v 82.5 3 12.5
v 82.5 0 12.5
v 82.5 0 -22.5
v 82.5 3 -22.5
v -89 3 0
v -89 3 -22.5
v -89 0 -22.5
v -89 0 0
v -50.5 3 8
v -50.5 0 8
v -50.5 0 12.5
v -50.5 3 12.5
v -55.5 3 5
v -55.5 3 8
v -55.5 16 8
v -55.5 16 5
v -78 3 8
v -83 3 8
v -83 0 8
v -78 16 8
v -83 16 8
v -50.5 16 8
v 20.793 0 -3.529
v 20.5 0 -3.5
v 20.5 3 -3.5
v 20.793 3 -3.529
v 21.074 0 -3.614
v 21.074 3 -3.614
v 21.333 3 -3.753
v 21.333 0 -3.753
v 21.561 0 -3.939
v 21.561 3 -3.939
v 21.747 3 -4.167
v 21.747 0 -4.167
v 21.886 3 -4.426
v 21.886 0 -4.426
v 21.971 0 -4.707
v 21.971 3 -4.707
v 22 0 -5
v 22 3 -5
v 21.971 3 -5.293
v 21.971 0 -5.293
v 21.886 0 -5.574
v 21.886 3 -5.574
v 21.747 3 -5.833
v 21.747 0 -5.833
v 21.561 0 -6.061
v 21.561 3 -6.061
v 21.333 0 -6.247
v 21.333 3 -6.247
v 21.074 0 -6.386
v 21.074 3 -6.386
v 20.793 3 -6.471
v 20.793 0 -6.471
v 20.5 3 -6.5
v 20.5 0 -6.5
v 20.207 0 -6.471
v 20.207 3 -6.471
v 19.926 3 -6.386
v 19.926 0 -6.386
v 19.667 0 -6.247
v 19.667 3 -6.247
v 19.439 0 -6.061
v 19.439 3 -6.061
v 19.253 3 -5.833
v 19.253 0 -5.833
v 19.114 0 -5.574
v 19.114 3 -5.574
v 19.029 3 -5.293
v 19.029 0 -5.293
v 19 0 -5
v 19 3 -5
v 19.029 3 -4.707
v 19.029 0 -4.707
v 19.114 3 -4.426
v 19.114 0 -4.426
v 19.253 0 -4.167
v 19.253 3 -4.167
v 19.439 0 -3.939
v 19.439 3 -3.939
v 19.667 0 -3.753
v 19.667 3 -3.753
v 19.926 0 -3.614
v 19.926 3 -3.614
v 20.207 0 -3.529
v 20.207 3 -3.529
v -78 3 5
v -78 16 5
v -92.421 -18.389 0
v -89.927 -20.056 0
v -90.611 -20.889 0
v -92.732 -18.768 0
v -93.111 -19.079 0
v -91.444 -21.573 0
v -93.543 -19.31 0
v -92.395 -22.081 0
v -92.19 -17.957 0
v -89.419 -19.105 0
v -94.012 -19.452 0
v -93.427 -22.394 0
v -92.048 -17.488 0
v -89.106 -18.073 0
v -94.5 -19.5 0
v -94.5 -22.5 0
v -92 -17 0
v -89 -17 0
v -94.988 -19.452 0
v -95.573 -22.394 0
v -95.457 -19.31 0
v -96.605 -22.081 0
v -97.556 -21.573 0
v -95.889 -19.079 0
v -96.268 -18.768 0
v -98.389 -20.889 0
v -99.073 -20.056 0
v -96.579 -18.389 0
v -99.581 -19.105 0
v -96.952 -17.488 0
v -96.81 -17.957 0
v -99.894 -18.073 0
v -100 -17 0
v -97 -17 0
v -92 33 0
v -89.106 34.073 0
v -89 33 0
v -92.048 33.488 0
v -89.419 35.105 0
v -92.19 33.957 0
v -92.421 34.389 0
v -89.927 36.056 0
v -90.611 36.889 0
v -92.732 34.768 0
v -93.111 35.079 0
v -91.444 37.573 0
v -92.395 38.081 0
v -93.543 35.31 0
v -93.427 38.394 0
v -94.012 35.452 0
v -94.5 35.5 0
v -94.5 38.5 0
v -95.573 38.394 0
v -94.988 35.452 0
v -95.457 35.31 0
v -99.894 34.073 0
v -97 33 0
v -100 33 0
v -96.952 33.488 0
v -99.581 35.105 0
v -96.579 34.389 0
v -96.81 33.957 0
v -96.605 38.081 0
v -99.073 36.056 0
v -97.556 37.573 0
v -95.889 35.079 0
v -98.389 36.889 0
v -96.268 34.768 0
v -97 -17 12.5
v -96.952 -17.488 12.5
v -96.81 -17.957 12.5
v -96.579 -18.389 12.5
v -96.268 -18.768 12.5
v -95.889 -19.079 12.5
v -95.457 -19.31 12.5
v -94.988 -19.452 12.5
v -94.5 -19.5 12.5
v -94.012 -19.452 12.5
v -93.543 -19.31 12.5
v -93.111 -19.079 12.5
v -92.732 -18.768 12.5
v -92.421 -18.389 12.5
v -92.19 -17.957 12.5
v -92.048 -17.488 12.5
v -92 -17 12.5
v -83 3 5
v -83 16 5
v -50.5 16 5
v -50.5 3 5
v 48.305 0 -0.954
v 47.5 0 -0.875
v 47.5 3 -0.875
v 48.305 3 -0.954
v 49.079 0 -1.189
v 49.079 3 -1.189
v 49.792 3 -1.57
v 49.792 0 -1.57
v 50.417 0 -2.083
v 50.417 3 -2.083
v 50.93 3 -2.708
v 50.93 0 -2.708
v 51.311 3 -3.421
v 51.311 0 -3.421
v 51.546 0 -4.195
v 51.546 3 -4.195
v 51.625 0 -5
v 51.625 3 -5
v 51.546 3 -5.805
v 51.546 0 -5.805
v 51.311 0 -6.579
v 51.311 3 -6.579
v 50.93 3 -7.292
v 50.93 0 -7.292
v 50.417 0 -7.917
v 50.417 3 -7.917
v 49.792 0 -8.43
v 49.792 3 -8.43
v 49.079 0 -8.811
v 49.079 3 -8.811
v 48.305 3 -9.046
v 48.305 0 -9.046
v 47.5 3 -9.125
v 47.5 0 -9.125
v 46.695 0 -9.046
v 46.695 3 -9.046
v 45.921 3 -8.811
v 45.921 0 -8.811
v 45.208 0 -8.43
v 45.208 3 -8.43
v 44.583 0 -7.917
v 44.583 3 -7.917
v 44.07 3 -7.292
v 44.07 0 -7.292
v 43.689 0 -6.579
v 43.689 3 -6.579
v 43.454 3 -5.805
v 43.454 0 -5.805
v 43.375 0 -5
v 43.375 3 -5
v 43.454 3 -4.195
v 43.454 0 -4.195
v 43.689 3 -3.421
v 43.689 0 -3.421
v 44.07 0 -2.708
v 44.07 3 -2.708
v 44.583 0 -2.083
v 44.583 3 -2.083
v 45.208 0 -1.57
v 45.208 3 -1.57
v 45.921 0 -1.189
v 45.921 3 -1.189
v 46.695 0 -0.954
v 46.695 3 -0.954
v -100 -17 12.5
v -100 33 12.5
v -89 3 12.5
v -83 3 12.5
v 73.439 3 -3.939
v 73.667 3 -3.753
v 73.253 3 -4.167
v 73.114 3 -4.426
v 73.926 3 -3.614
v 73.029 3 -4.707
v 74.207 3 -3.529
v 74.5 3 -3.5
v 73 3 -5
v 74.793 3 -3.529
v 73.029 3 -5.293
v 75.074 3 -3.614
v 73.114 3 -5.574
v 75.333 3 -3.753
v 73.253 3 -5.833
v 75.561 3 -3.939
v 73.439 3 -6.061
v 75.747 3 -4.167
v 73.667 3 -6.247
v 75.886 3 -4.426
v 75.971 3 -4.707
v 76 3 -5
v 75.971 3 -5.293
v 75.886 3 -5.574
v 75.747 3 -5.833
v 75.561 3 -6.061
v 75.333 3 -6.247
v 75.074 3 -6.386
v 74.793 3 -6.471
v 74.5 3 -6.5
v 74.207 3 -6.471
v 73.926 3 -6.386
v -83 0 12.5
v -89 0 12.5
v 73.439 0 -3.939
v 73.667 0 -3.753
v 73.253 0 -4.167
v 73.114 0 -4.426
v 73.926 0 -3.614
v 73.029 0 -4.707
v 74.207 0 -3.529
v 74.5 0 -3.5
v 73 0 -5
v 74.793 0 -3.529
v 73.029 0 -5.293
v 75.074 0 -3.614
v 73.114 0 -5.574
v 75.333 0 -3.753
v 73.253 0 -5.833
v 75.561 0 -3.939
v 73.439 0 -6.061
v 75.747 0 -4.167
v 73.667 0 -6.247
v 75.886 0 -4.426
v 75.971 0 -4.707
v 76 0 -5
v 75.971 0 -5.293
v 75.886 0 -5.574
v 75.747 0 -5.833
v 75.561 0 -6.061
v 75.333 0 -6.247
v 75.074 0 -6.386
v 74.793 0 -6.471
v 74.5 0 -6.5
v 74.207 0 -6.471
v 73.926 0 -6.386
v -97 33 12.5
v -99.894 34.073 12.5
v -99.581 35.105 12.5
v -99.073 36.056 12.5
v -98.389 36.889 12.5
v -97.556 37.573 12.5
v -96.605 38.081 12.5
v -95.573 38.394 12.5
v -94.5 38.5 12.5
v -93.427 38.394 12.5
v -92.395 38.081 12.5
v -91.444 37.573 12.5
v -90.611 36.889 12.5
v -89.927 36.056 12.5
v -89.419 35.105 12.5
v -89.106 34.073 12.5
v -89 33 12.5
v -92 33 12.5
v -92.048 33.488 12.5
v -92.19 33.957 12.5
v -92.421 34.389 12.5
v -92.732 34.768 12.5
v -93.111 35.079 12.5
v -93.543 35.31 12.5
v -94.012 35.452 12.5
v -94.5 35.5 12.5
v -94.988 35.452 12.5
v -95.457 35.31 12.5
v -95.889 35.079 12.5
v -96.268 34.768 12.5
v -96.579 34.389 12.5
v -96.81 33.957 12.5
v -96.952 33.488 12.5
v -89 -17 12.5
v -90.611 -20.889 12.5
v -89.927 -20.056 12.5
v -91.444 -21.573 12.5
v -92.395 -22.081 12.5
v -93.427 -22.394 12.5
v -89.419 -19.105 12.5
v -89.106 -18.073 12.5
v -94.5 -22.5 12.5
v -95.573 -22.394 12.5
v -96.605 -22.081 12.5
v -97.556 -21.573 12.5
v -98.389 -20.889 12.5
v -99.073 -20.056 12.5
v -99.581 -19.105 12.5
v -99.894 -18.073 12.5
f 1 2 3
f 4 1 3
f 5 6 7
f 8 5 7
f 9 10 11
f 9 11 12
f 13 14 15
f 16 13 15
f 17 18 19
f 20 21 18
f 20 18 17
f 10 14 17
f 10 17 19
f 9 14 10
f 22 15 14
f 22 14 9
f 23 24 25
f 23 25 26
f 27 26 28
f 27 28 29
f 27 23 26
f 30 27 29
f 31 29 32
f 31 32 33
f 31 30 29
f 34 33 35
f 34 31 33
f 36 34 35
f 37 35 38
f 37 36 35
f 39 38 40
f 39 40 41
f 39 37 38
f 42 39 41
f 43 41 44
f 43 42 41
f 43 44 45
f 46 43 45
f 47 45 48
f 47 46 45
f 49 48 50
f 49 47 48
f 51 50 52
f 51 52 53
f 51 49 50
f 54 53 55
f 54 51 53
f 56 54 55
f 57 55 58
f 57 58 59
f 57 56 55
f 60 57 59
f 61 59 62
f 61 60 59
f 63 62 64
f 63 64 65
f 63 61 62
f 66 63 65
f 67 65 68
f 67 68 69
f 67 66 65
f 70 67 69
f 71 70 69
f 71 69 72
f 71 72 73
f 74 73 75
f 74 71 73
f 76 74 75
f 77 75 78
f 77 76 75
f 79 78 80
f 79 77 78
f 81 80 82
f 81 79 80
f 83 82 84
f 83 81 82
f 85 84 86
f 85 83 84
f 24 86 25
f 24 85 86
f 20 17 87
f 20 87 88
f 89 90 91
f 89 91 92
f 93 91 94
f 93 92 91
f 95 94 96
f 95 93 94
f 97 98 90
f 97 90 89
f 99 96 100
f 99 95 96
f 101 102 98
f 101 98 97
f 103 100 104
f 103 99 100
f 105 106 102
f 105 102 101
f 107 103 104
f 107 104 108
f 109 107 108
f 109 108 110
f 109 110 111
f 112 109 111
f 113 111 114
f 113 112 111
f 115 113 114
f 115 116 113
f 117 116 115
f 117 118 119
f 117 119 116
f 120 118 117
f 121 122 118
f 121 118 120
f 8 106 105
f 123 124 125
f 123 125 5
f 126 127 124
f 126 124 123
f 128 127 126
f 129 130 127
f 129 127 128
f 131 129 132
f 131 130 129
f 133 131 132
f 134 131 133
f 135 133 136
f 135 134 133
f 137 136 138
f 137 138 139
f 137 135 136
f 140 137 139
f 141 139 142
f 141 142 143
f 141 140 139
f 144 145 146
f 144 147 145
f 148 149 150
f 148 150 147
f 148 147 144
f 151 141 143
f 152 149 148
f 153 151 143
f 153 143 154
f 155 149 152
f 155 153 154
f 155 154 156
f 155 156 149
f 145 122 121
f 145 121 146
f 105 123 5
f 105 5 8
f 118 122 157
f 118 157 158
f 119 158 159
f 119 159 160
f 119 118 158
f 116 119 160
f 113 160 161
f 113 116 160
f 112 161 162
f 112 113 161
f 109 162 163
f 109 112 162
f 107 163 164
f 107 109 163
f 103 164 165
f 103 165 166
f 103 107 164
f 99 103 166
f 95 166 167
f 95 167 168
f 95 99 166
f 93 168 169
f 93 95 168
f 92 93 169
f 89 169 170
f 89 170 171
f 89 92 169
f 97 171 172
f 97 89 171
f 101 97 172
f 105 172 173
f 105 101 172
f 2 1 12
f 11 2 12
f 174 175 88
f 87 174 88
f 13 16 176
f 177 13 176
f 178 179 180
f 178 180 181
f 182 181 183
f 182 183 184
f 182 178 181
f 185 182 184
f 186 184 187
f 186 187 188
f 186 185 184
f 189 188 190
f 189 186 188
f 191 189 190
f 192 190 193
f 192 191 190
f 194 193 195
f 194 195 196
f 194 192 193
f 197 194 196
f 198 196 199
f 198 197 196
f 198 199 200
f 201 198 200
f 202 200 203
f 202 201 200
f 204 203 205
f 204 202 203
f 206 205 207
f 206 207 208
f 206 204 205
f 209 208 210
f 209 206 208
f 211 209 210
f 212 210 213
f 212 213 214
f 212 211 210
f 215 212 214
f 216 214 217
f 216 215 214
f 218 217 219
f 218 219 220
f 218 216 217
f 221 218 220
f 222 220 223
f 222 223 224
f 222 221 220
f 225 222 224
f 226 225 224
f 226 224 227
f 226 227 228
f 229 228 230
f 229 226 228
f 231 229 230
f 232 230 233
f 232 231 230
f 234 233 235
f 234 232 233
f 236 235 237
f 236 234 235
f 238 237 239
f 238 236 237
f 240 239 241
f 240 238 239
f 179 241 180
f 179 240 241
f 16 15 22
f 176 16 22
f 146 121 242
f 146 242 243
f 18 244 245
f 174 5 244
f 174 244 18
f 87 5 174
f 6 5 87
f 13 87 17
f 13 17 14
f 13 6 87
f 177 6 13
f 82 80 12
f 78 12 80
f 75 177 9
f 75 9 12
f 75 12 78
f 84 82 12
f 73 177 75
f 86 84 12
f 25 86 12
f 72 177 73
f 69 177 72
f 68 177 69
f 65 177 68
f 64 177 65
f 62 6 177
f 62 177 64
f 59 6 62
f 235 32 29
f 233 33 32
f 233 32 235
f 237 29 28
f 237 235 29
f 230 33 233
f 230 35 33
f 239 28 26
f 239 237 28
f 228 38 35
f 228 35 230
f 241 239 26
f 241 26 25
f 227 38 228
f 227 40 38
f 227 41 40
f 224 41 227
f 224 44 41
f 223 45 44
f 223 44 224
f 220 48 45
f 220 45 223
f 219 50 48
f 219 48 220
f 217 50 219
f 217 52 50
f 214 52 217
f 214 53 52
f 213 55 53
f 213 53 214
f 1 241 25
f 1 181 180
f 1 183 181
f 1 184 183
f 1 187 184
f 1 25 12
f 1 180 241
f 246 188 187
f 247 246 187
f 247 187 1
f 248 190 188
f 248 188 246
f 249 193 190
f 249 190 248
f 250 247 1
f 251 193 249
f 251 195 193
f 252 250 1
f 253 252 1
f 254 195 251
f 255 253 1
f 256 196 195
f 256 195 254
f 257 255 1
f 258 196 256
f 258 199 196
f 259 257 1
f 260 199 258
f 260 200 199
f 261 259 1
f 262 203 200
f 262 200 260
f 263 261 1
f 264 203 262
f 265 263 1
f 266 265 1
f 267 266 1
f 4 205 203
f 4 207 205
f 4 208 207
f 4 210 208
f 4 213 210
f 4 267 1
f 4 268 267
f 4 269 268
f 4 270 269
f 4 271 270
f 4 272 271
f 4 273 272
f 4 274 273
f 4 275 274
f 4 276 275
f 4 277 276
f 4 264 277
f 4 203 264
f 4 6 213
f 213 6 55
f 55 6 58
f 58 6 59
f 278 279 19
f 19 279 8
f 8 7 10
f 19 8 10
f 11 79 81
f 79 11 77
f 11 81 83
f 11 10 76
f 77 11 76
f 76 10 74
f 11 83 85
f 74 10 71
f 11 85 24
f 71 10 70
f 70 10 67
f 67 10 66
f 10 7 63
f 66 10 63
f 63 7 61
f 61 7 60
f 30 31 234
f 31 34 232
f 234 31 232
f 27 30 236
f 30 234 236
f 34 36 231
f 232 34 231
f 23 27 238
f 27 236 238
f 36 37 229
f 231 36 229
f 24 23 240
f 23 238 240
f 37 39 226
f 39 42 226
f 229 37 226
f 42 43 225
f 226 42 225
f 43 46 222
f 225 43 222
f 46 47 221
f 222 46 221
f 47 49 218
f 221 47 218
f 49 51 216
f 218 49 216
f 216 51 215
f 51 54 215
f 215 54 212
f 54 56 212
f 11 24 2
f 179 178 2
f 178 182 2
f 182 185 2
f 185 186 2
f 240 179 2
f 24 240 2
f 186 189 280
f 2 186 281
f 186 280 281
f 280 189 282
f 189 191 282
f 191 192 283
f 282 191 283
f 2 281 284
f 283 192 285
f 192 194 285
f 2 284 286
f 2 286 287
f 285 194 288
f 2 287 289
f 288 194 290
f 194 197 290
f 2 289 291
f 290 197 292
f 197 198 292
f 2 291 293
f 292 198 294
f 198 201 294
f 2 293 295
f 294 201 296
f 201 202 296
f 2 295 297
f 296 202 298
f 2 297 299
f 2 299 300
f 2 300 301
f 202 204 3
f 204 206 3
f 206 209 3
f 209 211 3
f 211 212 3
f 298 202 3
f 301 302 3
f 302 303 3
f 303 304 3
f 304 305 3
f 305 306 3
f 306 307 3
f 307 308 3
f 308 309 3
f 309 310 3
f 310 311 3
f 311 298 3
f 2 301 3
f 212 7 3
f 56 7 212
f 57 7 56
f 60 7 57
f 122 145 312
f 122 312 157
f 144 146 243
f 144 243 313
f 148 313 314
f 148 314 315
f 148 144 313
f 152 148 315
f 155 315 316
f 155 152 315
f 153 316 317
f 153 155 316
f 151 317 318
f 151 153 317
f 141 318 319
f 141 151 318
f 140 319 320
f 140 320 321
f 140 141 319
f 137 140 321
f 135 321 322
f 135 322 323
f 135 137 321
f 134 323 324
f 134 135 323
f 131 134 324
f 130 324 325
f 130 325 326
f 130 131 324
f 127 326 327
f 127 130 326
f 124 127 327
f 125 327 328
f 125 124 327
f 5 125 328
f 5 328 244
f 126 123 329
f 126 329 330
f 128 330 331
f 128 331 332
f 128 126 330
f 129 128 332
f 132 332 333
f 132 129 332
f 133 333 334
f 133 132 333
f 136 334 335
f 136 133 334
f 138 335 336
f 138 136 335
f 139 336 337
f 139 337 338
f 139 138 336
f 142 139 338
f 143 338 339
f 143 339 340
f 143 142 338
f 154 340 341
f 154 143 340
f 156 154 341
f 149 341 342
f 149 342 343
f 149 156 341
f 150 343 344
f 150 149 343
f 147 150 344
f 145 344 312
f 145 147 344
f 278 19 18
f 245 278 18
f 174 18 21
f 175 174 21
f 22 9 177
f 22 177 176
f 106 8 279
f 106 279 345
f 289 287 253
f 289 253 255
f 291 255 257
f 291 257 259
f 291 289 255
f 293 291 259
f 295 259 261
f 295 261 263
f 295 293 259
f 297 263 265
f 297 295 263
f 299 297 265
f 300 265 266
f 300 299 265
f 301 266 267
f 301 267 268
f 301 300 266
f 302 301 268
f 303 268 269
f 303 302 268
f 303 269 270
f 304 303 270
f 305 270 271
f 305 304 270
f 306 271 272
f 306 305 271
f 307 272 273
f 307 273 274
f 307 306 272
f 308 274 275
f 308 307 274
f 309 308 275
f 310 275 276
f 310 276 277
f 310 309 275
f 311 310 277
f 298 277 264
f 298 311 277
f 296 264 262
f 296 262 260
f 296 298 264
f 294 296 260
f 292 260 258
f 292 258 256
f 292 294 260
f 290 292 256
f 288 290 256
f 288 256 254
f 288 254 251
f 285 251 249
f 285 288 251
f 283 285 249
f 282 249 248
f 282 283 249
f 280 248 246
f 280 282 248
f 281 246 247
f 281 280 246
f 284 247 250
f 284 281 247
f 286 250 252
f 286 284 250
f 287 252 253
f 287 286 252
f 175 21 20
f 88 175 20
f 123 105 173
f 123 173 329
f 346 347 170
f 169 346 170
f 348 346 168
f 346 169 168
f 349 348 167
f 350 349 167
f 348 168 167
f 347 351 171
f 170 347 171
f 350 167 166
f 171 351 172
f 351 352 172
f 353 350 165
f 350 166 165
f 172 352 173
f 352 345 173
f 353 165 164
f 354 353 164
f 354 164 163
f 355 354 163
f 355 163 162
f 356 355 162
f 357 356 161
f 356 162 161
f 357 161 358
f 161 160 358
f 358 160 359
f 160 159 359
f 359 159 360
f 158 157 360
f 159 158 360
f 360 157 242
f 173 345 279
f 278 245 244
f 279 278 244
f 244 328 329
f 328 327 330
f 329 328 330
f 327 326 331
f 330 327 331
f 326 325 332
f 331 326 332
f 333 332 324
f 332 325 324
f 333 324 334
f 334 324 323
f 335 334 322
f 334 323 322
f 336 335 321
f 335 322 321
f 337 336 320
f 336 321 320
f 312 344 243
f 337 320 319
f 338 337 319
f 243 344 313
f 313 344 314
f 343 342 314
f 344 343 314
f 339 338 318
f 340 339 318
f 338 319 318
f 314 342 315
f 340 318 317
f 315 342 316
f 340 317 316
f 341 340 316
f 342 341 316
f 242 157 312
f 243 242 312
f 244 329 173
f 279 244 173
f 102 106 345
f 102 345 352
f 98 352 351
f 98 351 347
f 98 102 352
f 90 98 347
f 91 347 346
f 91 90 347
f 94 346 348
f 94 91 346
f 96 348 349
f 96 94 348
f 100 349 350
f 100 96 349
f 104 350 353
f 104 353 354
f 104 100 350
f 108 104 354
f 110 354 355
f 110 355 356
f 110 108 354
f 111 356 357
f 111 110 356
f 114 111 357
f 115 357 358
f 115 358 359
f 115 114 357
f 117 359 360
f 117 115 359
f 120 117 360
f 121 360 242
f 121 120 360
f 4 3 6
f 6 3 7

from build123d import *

# Parameters (mm, degrees)
SKETCH1_W              = 70
SKETCH1_H              = 12
SKETCH1_R              = 1.5
SKETCH1_R_2            = 4.125
BOSS_EXTRUDE1_DEPTH    = 3
BOSS_EXTRUDE2_DEPTH    = 12.5
CUT_EXTRUDE1_START     = -22.5
CUT_EXTRUDE1_OUTLINE_W = 5
CUT_EXTRUDE1_OUTLINE_H = 3
CUT_EXTRUDE1_DEPTH     = 35
CUT_EXTRUDE2_START     = -22.5
CUT_EXTRUDE2_DEPTH     = 22.5
CUT_EXTRUDE3_START     = 8
SKETCH2_5_W            = 32.5
SKETCH2_5_H            = 9.897866997
CUT_EXTRUDE3_DEPTH     = 4.5
SKETCH4_W              = 5
SKETCH4_H              = 13
BOSS_EXTRUDE3_DEPTH    = 3


# Read off the part's stored shape, not the designer's step: Cut-Extrude1
with BuildPart() as part:
    # Sketch1 → Boss-Extrude1 (new body)
    # profile 1 of 2: a face of its own
    with BuildSketch(Plane(origin=(0, 0, 0), x_dir=(1, 0, 0), z_dir=(0, 1, 0))):
        Polygon((82.5, 22.5), (-100, 22.5), (-100, -12.5), (82.5, -12.5), (82.5, -1), (12.5, -1), (12.5, 11), (82.5, 11), align=None)
    # profile 2 of 2: a face of its own
    with BuildSketch(Plane(origin=(0, 0, 0), x_dir=(1, 0, 0), z_dir=(0, 1, 0))):
        with Locations((47.5, 5)):
            Rectangle(SKETCH1_W, SKETCH1_H)
        with Locations(Location((20.5, 5, 0), (0, 0, 270))):
            Circle(SKETCH1_R, mode=Mode.SUBTRACT)
        with Locations(Location((47.5, 5, 0), (0, 0, 270))):
            Circle(SKETCH1_R_2, mode=Mode.SUBTRACT)
        with Locations(Location((74.5, 5, 0), (0, 0, 270))):
            Circle(SKETCH1_R, mode=Mode.SUBTRACT)
    extrude(amount=BOSS_EXTRUDE1_DEPTH)

    # Sketch2 → Boss-Extrude2 (add)
    with BuildSketch(Plane.XY):
        with BuildLine():
            Line((-89, 33), (-89, -17))
            ThreePointArc((-89, -17), (-94.5, -22.5), (-100, -17))
            Line((-100, -17), (-100, 33))
            ThreePointArc((-100, 33), (-94.5, 38.5), (-89, 33))
        make_face()
        with BuildLine():
            ThreePointArc((-97, -17), (-94.5, -19.5), (-92, -17))
            Line((-92, -17), (-92, 33))
            ThreePointArc((-92, 33), (-94.5, 35.5), (-97, 33))
            Line((-97, 33), (-97, -17))
        make_face(mode=Mode.SUBTRACT)
    extrude(amount=BOSS_EXTRUDE2_DEPTH)

    # Cut-Extrude1 outline → Cut-Extrude1 (cut)
    with BuildSketch(Plane.XY.offset(CUT_EXTRUDE1_START)):
        with Locations((-94.5, 1.5)):
            Rectangle(CUT_EXTRUDE1_OUTLINE_W, CUT_EXTRUDE1_OUTLINE_H)
    extrude(amount=CUT_EXTRUDE1_DEPTH, mode=Mode.SUBTRACT)

    # Sketch2<3> → Cut-Extrude2 (cut)
    with BuildSketch(Plane.XY.offset(CUT_EXTRUDE2_START)):
        with BuildLine():
            Line((-89, 33), (-89, -17))
            ThreePointArc((-89, -17), (-94.5, -22.5), (-100, -17))
            Line((-100, -17), (-100, 33))
            ThreePointArc((-100, 33), (-94.5, 38.5), (-89, 33))
        make_face()
        with BuildLine():
            ThreePointArc((-97, -17), (-94.5, -19.5), (-92, -17))
            Line((-92, -17), (-92, 33))
            ThreePointArc((-92, 33), (-94.5, 35.5), (-97, 33))
            Line((-97, 33), (-97, -17))
        make_face(mode=Mode.SUBTRACT)
    extrude(amount=CUT_EXTRUDE2_DEPTH, mode=Mode.SUBTRACT)

    # Sketch2<5> → Cut-Extrude3 (cut)
    with BuildSketch(Plane.XY.offset(CUT_EXTRUDE3_START)):
        with Locations((-66.75, 1.550857661)):
            Rectangle(SKETCH2_5_W, SKETCH2_5_H)
    extrude(amount=CUT_EXTRUDE3_DEPTH, mode=Mode.SUBTRACT)

    # Sketch4 → Boss-Extrude3 (add)
    with BuildSketch(Plane.XY.offset(8)):
        with Locations((-80.5, 9.5)):
            Rectangle(SKETCH4_W, SKETCH4_H)
        with Locations((-53, 9.5)):
            Rectangle(SKETCH4_W, SKETCH4_H)
    extrude(amount=-BOSS_EXTRUDE3_DEPTH)


solid = part.part
